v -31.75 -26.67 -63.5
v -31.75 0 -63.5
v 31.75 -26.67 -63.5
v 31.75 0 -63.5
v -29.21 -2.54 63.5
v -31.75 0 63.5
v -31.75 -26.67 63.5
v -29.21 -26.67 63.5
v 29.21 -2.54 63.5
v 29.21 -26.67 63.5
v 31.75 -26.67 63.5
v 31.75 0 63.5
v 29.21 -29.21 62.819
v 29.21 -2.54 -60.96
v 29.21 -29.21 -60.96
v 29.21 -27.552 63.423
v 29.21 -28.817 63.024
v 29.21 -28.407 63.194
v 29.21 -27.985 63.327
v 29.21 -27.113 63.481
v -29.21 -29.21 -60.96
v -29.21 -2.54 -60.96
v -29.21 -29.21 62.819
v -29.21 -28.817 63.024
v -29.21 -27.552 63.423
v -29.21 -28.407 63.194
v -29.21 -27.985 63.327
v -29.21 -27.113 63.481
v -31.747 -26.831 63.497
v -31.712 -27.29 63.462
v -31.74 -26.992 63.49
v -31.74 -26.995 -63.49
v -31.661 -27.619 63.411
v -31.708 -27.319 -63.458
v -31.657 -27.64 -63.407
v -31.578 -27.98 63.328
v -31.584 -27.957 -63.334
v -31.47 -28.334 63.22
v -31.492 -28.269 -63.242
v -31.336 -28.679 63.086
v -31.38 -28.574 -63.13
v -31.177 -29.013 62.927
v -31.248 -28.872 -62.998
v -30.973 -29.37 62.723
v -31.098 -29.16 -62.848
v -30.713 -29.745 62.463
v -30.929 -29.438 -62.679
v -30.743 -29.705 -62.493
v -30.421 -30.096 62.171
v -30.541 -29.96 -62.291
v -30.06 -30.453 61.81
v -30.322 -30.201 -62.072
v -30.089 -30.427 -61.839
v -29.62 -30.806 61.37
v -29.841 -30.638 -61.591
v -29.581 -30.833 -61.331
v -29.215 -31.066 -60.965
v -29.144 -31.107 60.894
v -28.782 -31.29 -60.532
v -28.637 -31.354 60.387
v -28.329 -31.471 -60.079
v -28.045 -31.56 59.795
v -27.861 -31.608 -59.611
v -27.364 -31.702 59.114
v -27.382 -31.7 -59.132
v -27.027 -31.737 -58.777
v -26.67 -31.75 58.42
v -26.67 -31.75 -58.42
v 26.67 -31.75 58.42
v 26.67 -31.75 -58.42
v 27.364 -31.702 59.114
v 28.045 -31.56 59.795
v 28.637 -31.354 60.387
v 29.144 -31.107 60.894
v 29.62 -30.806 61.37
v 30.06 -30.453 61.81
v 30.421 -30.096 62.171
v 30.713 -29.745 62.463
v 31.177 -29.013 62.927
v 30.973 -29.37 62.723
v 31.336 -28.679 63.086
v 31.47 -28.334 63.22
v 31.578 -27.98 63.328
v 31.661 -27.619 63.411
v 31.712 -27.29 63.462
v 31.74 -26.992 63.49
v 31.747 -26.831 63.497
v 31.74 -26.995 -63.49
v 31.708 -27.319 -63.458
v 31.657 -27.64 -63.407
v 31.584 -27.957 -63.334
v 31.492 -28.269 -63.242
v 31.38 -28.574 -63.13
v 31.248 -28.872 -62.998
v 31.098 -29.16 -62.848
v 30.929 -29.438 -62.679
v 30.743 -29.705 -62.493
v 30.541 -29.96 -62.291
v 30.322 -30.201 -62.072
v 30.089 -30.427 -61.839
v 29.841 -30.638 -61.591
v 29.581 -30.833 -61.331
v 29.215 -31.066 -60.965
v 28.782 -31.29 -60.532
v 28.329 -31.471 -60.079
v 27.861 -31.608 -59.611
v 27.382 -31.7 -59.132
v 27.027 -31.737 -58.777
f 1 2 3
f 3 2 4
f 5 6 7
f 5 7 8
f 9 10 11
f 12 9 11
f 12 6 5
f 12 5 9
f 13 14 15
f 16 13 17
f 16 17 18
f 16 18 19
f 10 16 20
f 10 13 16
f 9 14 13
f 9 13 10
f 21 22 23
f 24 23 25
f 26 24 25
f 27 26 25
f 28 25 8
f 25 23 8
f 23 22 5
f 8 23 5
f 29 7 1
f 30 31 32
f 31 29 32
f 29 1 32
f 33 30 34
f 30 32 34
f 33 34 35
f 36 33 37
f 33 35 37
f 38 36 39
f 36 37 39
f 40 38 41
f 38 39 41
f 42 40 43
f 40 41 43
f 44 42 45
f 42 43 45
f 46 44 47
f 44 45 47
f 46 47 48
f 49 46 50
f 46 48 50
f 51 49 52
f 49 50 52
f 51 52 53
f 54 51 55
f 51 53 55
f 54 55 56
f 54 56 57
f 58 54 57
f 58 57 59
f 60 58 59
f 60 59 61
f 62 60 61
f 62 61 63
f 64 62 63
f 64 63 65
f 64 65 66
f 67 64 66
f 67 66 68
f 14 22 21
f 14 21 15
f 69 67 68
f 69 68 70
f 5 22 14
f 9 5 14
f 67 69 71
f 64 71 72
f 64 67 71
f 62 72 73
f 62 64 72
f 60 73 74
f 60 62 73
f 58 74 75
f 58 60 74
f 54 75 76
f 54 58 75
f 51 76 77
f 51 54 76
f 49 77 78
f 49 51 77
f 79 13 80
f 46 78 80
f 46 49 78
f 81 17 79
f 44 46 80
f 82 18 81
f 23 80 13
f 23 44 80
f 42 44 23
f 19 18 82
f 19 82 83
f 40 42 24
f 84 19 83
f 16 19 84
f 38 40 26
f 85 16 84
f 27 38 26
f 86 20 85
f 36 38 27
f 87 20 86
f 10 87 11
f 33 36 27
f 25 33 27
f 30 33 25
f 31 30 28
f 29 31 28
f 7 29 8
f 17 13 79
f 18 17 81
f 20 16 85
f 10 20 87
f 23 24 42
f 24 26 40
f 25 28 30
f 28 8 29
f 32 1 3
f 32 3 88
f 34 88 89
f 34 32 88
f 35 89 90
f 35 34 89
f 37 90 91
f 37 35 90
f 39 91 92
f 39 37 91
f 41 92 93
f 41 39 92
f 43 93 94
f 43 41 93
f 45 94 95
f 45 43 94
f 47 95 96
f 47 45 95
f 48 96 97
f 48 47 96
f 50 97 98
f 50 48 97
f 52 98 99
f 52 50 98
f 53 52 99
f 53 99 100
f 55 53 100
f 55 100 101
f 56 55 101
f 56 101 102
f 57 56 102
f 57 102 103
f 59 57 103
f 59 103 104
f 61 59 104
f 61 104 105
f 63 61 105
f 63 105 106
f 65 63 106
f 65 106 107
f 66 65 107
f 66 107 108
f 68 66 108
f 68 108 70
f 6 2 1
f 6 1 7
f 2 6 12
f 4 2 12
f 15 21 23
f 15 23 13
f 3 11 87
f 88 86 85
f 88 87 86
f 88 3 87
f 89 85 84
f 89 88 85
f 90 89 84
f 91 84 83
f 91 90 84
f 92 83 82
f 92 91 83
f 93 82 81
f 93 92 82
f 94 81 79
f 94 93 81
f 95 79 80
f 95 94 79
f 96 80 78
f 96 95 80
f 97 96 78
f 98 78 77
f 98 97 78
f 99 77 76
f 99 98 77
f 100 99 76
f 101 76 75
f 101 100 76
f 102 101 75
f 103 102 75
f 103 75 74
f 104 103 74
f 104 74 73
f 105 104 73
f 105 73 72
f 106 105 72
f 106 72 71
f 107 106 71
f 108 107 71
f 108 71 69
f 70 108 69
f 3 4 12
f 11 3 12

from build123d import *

# Parameters (mm, degrees)
F0_W        = 63.5
F0_H        = 127
F1_DEPTH    = 31.75
F2_T        = -2.54
F3_T1_DEPTH = 88.9
F3_T3_DEPTH = 152.4


# Not quite as in the source:
# - a fillet or chamfer that OpenCascade refuses, or shapes differently, is made with other operations: its cross-section is extruded or revolved along the edge and cut away or added


with BuildPart() as f1:
    # F0 (on Front) → F1 (new body)
    with BuildSketch(Plane.XZ):
        Rectangle(F0_W, F0_H)
    extrude(amount=F1_DEPTH)

    # F2
    f2_openings = [f1.faces().sort_by_distance(p)[0] for p in [
        (0, -15.875, 63.5),
    ]]
    offset(amount=F2_T, openings=f2_openings)

    # F3: fillet of radius 5.08 on 4 edges, made by hand

    # F3_s2 → F3_t1 (cut)
    with BuildSketch(Plane.YZ.offset(-44.45)):
        with BuildLine():
            ThreePointArc((-31.75, 58.42), (-30.2621024484, 62.0121024484), (-26.67, 63.5))
            Line((-26.67, 63.5), (-31.75, 63.5))
            Line((-31.75, 63.5), (-31.75, 58.42))
        make_face()
        with BuildLine():
            ThreePointArc((-26.67, -63.5), (-30.2621024484, -62.0121024484), (-31.75, -58.42))
            Line((-31.75, -58.42), (-31.75, -63.5))
            Line((-31.75, -63.5), (-26.67, -63.5))
        make_face()
    extrude(amount=F3_T1_DEPTH, mode=Mode.SUBTRACT)

    # F3_s4 → F3_t3 (cut)
    with BuildSketch(Plane.XY.offset(-76.2)):
        with BuildLine():
            ThreePointArc((-31.75, -26.67), (-30.2621024484, -30.2621024484), (-26.67, -31.75))
            Line((-26.67, -31.75), (-31.75, -31.75))
            Line((-31.75, -31.75), (-31.75, -26.67))
        make_face()
        with BuildLine():
            ThreePointArc((31.75, -26.67), (30.2621024484, -30.2621024484), (26.67, -31.75))
            Line((26.67, -31.75), (31.75, -31.75))
            Line((31.75, -31.75), (31.75, -26.67))
        make_face()
    extrude(amount=F3_T3_DEPTH, mode=Mode.SUBTRACT)


solid = f1.part
